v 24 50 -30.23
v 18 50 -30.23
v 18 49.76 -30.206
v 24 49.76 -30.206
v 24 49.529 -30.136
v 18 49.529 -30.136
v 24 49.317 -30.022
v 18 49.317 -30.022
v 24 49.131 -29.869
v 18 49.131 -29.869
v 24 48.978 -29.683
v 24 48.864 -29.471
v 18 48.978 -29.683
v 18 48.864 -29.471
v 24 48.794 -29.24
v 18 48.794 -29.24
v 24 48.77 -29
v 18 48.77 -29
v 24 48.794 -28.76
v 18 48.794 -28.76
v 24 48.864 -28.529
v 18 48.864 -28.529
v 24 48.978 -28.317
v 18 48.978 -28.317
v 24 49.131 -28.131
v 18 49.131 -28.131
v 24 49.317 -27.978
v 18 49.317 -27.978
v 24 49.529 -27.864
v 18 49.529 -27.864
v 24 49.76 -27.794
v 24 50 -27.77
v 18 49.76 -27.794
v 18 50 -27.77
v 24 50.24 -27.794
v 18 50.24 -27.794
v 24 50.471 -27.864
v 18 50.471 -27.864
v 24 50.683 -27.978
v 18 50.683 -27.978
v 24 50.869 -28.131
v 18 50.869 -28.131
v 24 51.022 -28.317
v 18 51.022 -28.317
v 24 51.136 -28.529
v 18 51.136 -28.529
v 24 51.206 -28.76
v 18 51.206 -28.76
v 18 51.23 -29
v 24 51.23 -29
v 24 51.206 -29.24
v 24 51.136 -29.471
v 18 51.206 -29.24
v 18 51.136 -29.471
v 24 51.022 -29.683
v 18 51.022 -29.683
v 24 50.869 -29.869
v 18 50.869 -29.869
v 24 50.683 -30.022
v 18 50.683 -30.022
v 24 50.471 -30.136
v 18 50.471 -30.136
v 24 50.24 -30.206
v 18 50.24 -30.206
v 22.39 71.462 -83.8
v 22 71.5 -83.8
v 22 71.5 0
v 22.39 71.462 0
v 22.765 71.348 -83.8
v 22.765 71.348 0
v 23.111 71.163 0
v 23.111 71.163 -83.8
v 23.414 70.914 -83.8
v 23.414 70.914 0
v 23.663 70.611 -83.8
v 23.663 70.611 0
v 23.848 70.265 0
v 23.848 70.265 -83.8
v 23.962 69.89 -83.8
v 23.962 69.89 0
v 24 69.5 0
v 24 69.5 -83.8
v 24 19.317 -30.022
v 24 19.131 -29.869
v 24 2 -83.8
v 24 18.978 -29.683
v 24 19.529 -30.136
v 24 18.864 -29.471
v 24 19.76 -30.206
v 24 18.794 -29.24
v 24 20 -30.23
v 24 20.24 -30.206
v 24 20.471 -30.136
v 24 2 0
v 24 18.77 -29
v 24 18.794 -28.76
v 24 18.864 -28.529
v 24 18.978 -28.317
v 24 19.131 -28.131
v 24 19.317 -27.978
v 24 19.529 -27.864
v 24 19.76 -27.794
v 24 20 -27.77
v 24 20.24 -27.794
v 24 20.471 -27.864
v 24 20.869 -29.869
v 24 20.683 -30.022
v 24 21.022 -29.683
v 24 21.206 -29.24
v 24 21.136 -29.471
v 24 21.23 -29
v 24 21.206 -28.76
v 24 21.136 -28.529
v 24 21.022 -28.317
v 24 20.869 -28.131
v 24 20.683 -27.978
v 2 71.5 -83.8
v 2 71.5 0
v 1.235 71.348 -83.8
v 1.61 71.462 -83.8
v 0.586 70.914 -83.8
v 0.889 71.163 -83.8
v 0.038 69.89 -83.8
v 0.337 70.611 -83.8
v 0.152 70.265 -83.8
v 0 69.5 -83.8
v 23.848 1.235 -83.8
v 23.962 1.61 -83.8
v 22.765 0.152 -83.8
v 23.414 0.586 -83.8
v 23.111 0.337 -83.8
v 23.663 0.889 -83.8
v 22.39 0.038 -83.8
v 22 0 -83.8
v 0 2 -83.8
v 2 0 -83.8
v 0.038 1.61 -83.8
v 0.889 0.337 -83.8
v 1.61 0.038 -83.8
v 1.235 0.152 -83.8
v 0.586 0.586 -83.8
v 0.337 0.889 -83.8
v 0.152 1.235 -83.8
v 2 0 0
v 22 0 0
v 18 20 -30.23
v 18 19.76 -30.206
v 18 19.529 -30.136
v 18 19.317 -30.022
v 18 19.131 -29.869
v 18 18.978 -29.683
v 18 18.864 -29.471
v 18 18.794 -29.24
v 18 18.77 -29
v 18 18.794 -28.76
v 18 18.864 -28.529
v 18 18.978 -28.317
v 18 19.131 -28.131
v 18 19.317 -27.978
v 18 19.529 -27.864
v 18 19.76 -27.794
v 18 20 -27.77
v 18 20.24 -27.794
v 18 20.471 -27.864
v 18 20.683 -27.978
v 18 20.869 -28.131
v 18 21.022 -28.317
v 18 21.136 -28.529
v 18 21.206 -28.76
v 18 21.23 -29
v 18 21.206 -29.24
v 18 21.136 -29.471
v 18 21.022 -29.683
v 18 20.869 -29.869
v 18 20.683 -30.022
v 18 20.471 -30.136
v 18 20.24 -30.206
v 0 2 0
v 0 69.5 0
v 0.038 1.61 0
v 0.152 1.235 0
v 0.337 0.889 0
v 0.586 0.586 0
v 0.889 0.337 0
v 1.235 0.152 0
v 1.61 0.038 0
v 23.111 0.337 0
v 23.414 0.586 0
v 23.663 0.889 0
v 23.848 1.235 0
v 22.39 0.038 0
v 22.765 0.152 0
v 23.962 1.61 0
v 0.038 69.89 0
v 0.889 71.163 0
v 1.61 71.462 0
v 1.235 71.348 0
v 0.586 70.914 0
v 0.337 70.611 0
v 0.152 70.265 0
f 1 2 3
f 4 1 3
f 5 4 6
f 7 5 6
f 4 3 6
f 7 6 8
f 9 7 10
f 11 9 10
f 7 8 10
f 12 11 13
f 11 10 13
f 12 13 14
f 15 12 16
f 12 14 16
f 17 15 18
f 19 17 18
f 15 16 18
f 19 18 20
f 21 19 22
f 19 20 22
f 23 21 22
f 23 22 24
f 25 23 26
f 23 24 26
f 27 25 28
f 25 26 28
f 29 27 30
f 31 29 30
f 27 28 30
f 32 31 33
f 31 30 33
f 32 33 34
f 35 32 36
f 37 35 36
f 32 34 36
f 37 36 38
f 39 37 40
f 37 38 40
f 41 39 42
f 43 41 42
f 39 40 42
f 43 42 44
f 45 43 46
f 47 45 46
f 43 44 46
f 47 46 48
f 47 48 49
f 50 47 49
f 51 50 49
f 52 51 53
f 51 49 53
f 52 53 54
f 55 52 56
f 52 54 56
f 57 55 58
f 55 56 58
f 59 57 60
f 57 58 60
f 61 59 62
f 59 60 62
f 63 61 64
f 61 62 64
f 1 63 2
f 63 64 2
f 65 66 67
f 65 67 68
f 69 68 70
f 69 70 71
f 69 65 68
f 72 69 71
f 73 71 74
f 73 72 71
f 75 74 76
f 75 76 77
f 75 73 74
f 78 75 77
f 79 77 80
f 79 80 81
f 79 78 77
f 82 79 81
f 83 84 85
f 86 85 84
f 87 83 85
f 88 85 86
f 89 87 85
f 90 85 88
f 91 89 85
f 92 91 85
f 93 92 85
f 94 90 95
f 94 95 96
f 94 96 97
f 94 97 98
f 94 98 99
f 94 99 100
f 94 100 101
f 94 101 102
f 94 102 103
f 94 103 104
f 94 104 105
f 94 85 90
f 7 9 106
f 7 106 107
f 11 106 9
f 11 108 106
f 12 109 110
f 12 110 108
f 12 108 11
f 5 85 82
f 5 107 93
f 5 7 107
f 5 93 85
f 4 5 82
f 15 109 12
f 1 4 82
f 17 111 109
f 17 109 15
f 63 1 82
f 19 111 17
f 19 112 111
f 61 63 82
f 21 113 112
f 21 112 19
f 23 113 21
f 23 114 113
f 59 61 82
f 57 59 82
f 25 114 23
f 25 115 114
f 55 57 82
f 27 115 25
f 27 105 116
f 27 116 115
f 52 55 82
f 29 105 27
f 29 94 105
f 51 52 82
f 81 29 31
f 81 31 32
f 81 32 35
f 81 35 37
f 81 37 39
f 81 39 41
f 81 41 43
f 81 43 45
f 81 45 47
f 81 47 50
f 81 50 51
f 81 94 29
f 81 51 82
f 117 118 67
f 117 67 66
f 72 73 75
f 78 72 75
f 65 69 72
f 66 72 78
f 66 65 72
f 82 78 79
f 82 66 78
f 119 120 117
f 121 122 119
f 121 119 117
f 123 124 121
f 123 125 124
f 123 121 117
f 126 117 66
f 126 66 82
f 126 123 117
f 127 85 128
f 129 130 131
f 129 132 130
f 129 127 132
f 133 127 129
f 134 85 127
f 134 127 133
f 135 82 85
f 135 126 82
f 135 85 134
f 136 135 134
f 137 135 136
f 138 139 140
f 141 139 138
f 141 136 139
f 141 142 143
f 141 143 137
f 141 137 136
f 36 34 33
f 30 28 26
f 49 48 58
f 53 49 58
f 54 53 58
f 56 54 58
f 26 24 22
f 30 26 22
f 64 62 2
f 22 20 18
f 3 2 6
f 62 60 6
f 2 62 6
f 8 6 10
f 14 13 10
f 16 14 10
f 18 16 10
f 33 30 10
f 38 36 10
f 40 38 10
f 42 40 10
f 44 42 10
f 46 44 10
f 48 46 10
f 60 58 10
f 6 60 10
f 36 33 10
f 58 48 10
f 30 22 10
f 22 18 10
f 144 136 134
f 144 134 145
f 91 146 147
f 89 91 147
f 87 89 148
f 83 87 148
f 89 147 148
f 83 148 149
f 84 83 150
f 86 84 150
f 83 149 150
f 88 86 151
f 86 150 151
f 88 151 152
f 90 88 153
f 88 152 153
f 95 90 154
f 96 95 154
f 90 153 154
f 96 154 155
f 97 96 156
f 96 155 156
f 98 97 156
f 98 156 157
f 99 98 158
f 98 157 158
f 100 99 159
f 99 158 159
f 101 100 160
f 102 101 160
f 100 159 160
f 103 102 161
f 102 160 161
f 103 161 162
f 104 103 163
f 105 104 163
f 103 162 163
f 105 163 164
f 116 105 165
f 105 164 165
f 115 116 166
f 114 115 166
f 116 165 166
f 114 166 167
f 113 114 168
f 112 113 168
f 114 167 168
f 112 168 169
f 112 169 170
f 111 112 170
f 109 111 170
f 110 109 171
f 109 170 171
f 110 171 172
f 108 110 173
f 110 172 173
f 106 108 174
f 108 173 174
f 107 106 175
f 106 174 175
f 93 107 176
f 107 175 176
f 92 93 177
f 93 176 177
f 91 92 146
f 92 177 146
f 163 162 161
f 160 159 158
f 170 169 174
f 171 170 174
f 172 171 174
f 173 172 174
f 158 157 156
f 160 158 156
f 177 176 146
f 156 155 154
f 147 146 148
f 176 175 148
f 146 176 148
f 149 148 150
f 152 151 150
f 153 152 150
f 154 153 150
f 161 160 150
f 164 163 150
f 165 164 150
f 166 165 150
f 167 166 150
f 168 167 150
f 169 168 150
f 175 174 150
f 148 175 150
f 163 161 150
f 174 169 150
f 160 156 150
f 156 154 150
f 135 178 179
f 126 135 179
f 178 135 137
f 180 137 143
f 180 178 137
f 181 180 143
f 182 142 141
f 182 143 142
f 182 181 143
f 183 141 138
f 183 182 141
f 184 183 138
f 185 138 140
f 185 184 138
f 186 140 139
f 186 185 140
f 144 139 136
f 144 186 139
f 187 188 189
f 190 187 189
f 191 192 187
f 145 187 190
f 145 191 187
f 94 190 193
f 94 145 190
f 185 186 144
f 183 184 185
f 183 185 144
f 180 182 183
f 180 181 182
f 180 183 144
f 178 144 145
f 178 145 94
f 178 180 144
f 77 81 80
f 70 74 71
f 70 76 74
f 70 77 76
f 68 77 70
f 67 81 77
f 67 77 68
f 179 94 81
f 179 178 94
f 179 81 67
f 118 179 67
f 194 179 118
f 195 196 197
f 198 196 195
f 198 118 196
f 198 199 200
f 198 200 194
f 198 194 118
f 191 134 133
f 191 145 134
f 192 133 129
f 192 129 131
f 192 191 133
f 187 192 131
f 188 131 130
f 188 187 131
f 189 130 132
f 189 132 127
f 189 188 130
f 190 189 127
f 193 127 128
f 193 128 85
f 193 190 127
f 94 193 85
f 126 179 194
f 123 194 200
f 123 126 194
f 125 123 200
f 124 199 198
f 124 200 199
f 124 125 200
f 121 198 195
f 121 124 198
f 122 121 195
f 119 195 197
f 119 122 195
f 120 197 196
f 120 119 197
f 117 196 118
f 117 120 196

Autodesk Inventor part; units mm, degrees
ref_plane "YZ Plane" through (0, 0, 0) normal (1, 0, 0) x (0, 1, 0)
ref_plane "XZ Plane" through (0, 0, 0) normal (0, 1, 0) x (-1, 0, 0)
ref_plane "XY Plane" through (0, 0, 0) normal (0, 0, 1) x (1, 0, 0)
sketch "Sketch1" plane through (0, 0, 0) normal (1, 0, 0) x (0, 1, 0)
  line L0 (0, 0) -> (71.5, 0)
  line L1 (71.5, 0) -> (71.5, -83.8)
  line L2 (71.5, -83.8) -> (0, -83.8)
  line L3 (0, -83.8) -> (0, 0)
  dimension "d0" = 83.8
  dimension "d1" = 71.5
extrude "Extrusion1" add sketch "Sketch1" along normal blind 24
fillet "Fillet1" radius 2 4 edges at (24, 71.5, -41.9) (0, 71.5, -41.9) (24, 0, -41.9) (0, 0, -41.9)
sketch "Sketch4" plane through (24, 0, 0) normal (1, 0, 0) x (0, 0, -1)
  line L0 (0, 0) -> (83.8, 0) projected
  line L1 (0, 69.5) -> (0, 2) projected
  point P0 (29, 20)
  point P1 (29, 50)
  dimension "d22" = 20
  dimension "d23" = 50
  dimension "d24" = 29
hole "Hole3" at (24, 20, -29) at (24, 50, -29) direction (-1, 0, 0) diameter 2.459 depth 6 thread size "M3x0.5" class "6H" standard "ANSI Metric M Profile"
properties part number "Meinberg_Box"
